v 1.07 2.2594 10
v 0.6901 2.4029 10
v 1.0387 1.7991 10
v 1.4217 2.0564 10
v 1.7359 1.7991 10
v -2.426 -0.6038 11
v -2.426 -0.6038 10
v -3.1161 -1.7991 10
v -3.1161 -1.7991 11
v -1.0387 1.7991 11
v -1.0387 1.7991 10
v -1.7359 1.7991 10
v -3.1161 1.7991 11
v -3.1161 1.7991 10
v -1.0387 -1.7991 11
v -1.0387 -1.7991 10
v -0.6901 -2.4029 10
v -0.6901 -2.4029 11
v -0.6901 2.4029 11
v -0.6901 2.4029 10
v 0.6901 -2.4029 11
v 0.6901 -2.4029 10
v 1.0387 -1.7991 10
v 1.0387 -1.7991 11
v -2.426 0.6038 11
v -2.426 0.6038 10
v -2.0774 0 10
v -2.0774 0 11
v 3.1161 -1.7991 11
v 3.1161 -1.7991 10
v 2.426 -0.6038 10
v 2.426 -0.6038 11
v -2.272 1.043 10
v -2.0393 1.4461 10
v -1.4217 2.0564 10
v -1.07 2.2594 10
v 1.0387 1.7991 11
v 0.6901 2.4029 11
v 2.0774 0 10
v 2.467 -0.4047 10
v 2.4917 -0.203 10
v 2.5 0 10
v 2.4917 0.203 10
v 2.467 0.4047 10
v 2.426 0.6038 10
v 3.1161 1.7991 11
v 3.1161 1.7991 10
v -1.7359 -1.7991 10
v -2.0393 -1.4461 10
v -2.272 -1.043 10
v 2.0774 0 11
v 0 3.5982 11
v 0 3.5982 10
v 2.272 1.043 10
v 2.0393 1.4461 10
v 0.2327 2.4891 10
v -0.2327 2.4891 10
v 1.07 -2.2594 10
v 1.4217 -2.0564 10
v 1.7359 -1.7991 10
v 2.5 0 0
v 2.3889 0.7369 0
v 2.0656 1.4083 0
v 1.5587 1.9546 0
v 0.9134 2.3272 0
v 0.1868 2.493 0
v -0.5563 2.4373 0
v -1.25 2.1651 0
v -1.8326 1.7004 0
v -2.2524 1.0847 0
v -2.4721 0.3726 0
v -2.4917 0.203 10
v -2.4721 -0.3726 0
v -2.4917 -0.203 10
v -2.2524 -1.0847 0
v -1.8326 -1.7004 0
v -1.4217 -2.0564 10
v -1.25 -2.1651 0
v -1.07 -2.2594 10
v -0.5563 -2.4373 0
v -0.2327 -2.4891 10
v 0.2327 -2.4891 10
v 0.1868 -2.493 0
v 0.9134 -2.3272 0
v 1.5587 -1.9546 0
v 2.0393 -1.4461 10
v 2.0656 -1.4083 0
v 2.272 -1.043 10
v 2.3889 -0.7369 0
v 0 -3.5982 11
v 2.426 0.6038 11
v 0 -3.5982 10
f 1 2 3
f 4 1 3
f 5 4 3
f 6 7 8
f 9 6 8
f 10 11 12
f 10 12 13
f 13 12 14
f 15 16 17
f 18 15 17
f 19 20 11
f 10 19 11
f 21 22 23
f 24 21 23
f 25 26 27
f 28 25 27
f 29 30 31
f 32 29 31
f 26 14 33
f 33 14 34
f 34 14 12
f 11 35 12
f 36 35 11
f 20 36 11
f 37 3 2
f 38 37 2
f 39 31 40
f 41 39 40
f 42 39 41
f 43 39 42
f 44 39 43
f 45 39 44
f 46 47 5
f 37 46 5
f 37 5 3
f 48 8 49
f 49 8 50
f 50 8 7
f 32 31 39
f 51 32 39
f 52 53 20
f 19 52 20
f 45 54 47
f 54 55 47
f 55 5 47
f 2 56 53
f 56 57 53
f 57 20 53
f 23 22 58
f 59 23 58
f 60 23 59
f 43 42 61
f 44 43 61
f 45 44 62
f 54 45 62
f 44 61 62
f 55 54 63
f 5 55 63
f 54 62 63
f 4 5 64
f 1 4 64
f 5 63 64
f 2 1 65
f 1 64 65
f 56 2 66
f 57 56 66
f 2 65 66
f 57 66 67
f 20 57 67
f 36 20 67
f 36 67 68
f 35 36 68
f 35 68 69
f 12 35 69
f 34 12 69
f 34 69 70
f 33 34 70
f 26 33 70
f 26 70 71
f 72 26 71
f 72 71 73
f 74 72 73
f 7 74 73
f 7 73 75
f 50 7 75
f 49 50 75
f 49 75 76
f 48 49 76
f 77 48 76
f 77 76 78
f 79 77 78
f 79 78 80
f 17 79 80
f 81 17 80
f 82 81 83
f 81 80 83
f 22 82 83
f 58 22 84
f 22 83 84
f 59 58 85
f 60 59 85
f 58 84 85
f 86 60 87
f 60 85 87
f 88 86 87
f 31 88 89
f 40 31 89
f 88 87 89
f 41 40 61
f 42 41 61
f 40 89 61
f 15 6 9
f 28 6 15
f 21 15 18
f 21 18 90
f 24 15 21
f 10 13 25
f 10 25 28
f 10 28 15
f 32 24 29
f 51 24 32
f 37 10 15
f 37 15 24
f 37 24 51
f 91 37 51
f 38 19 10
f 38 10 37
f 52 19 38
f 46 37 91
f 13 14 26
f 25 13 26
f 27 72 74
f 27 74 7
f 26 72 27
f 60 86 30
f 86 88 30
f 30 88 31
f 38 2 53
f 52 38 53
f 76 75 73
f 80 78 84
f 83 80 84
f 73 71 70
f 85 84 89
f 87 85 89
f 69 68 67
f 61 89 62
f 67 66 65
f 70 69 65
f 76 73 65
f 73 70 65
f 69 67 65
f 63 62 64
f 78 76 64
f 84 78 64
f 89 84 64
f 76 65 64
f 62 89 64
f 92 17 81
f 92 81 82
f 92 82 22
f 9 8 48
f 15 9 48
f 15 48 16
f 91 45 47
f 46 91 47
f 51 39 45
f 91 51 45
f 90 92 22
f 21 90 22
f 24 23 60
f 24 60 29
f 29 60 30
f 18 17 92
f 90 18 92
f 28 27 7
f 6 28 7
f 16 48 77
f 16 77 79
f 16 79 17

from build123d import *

# Parameters (mm, degrees)
SKETCH_1_R      = 2.5
EXTRUDE_1_DEPTH = 10
EXTRUDE_2_DEPTH = 1


with BuildPart() as part:
    # 스케치1 → 보스-돌출1 (new body)
    with BuildSketch(Plane.XY):
        Circle(SKETCH_1_R)
    extrude(amount=EXTRUDE_1_DEPTH)

    # 스케치2 → 보스-돌출2 (add)
    with BuildSketch(Plane.XY.offset(10)):
        with BuildLine():
            ThreePointArc((-2.425994905, 0.603778702), (-2.165063509, 1.25), (-1.735885147, 1.799083866))
            Line((-1.735885147, 1.799083866), (-3.116104663, 1.799083866))
            Line((-3.116104663, 1.799083866), (-2.425994905, 0.603778702))
        make_face()
        with BuildLine():
            Line((-2.077403109, 0), (-1.038701554, 1.799083866))
            Line((-1.038701554, 1.799083866), (-1.735885147, 1.799083866))
            ThreePointArc((-1.735885147, 1.799083866), (-2.165063509, 1.25), (-2.425994905, 0.603778702))
            Line((-2.425994905, 0.603778702), (-2.077403109, 0))
        make_face()
        with BuildLine():
            Line((-1.038701554, 1.799083866), (1.038701554, 1.799083866))
            Line((1.038701554, 1.799083866), (0.690109758, 2.402862568))
            ThreePointArc((0.690109758, 2.402862568), (0, 2.5), (-0.690109758, 2.402862568))
            Line((-0.690109758, 2.402862568), (-1.038701554, 1.799083866))
        make_face()
        with BuildLine():
            Line((2.425994905, 0.603778702), (3.116104663, 1.799083866))
            Line((3.116104663, 1.799083866), (1.735885147, 1.799083866))
            ThreePointArc((1.735885147, 1.799083866), (2.165063509, 1.25), (2.425994905, 0.603778702))
        make_face()
        with BuildLine():
            ThreePointArc((2.425994905, 0.603778702), (2.165063509, 1.25), (1.735885147, 1.799083866))
            Line((1.735885147, 1.799083866), (1.038701554, 1.799083866))
            Line((1.038701554, 1.799083866), (2.077403109, 0))
            Line((2.077403109, 0), (2.425994905, 0.603778702))
        make_face()
        with BuildLine():
            Line((3.116104663, -1.799083866), (2.425994905, -0.603778702))
            ThreePointArc((2.425994905, -0.603778702), (2.165063509, -1.25), (1.735885147, -1.799083866))
            Line((1.735885147, -1.799083866), (3.116104663, -1.799083866))
        make_face()
        with BuildLine():
            Line((2.425994905, -0.603778702), (2.077403109, 0))
            Line((2.077403109, 0), (1.038701554, -1.799083866))
            Line((1.038701554, -1.799083866), (1.735885147, -1.799083866))
            ThreePointArc((1.735885147, -1.799083866), (2.165063509, -1.25), (2.425994905, -0.603778702))
        make_face()
        with BuildLine():
            Line((0, -3.598167732), (0.690109758, -2.402862568))
            ThreePointArc((0.690109758, -2.402862568), (0, -2.5), (-0.690109758, -2.402862568))
            Line((-0.690109758, -2.402862568), (0, -3.598167732))
        make_face()
        with BuildLine():
            Line((0.690109758, -2.402862568), (1.038701554, -1.799083866))
            Line((1.038701554, -1.799083866), (-1.038701554, -1.799083866))
            Line((-1.038701554, -1.799083866), (-0.690109758, -2.402862568))
            ThreePointArc((-0.690109758, -2.402862568), (0, -2.5), (0.690109758, -2.402862568))
        make_face()
        with BuildLine():
            Line((-1.038701554, -1.799083866), (-2.077403109, 0))
            Line((-2.077403109, 0), (-2.425994905, -0.603778702))
            ThreePointArc((-2.425994905, -0.603778702), (-2.165063509, -1.25), (-1.735885147, -1.799083866))
            Line((-1.735885147, -1.799083866), (-1.038701554, -1.799083866))
        make_face()
        with BuildLine():
            ThreePointArc((-1.735885147, -1.799083866), (-2.165063509, -1.25), (-2.425994905, -0.603778702))
            Line((-2.425994905, -0.603778702), (-3.116104663, -1.799083866))
            Line((-3.116104663, -1.799083866), (-1.735885147, -1.799083866))
        make_face()
        Polygon((0, -3.598167732), (3.116104663, 1.799083866), (-3.116104663, 1.799083866), align=None)
        Polygon((3.116104663, -1.799083866), (0, 3.598167732), (-3.116104663, -1.799083866), align=None)
        with BuildLine():
            ThreePointArc((-0.690109758, 2.402862568), (0, 2.5), (0.690109758, 2.402862568))
            Line((0.690109758, 2.402862568), (0, 3.598167732))
            Line((0, 3.598167732), (-0.690109758, 2.402862568))
        make_face()
    extrude(amount=EXTRUDE_2_DEPTH)


solid = part.part
